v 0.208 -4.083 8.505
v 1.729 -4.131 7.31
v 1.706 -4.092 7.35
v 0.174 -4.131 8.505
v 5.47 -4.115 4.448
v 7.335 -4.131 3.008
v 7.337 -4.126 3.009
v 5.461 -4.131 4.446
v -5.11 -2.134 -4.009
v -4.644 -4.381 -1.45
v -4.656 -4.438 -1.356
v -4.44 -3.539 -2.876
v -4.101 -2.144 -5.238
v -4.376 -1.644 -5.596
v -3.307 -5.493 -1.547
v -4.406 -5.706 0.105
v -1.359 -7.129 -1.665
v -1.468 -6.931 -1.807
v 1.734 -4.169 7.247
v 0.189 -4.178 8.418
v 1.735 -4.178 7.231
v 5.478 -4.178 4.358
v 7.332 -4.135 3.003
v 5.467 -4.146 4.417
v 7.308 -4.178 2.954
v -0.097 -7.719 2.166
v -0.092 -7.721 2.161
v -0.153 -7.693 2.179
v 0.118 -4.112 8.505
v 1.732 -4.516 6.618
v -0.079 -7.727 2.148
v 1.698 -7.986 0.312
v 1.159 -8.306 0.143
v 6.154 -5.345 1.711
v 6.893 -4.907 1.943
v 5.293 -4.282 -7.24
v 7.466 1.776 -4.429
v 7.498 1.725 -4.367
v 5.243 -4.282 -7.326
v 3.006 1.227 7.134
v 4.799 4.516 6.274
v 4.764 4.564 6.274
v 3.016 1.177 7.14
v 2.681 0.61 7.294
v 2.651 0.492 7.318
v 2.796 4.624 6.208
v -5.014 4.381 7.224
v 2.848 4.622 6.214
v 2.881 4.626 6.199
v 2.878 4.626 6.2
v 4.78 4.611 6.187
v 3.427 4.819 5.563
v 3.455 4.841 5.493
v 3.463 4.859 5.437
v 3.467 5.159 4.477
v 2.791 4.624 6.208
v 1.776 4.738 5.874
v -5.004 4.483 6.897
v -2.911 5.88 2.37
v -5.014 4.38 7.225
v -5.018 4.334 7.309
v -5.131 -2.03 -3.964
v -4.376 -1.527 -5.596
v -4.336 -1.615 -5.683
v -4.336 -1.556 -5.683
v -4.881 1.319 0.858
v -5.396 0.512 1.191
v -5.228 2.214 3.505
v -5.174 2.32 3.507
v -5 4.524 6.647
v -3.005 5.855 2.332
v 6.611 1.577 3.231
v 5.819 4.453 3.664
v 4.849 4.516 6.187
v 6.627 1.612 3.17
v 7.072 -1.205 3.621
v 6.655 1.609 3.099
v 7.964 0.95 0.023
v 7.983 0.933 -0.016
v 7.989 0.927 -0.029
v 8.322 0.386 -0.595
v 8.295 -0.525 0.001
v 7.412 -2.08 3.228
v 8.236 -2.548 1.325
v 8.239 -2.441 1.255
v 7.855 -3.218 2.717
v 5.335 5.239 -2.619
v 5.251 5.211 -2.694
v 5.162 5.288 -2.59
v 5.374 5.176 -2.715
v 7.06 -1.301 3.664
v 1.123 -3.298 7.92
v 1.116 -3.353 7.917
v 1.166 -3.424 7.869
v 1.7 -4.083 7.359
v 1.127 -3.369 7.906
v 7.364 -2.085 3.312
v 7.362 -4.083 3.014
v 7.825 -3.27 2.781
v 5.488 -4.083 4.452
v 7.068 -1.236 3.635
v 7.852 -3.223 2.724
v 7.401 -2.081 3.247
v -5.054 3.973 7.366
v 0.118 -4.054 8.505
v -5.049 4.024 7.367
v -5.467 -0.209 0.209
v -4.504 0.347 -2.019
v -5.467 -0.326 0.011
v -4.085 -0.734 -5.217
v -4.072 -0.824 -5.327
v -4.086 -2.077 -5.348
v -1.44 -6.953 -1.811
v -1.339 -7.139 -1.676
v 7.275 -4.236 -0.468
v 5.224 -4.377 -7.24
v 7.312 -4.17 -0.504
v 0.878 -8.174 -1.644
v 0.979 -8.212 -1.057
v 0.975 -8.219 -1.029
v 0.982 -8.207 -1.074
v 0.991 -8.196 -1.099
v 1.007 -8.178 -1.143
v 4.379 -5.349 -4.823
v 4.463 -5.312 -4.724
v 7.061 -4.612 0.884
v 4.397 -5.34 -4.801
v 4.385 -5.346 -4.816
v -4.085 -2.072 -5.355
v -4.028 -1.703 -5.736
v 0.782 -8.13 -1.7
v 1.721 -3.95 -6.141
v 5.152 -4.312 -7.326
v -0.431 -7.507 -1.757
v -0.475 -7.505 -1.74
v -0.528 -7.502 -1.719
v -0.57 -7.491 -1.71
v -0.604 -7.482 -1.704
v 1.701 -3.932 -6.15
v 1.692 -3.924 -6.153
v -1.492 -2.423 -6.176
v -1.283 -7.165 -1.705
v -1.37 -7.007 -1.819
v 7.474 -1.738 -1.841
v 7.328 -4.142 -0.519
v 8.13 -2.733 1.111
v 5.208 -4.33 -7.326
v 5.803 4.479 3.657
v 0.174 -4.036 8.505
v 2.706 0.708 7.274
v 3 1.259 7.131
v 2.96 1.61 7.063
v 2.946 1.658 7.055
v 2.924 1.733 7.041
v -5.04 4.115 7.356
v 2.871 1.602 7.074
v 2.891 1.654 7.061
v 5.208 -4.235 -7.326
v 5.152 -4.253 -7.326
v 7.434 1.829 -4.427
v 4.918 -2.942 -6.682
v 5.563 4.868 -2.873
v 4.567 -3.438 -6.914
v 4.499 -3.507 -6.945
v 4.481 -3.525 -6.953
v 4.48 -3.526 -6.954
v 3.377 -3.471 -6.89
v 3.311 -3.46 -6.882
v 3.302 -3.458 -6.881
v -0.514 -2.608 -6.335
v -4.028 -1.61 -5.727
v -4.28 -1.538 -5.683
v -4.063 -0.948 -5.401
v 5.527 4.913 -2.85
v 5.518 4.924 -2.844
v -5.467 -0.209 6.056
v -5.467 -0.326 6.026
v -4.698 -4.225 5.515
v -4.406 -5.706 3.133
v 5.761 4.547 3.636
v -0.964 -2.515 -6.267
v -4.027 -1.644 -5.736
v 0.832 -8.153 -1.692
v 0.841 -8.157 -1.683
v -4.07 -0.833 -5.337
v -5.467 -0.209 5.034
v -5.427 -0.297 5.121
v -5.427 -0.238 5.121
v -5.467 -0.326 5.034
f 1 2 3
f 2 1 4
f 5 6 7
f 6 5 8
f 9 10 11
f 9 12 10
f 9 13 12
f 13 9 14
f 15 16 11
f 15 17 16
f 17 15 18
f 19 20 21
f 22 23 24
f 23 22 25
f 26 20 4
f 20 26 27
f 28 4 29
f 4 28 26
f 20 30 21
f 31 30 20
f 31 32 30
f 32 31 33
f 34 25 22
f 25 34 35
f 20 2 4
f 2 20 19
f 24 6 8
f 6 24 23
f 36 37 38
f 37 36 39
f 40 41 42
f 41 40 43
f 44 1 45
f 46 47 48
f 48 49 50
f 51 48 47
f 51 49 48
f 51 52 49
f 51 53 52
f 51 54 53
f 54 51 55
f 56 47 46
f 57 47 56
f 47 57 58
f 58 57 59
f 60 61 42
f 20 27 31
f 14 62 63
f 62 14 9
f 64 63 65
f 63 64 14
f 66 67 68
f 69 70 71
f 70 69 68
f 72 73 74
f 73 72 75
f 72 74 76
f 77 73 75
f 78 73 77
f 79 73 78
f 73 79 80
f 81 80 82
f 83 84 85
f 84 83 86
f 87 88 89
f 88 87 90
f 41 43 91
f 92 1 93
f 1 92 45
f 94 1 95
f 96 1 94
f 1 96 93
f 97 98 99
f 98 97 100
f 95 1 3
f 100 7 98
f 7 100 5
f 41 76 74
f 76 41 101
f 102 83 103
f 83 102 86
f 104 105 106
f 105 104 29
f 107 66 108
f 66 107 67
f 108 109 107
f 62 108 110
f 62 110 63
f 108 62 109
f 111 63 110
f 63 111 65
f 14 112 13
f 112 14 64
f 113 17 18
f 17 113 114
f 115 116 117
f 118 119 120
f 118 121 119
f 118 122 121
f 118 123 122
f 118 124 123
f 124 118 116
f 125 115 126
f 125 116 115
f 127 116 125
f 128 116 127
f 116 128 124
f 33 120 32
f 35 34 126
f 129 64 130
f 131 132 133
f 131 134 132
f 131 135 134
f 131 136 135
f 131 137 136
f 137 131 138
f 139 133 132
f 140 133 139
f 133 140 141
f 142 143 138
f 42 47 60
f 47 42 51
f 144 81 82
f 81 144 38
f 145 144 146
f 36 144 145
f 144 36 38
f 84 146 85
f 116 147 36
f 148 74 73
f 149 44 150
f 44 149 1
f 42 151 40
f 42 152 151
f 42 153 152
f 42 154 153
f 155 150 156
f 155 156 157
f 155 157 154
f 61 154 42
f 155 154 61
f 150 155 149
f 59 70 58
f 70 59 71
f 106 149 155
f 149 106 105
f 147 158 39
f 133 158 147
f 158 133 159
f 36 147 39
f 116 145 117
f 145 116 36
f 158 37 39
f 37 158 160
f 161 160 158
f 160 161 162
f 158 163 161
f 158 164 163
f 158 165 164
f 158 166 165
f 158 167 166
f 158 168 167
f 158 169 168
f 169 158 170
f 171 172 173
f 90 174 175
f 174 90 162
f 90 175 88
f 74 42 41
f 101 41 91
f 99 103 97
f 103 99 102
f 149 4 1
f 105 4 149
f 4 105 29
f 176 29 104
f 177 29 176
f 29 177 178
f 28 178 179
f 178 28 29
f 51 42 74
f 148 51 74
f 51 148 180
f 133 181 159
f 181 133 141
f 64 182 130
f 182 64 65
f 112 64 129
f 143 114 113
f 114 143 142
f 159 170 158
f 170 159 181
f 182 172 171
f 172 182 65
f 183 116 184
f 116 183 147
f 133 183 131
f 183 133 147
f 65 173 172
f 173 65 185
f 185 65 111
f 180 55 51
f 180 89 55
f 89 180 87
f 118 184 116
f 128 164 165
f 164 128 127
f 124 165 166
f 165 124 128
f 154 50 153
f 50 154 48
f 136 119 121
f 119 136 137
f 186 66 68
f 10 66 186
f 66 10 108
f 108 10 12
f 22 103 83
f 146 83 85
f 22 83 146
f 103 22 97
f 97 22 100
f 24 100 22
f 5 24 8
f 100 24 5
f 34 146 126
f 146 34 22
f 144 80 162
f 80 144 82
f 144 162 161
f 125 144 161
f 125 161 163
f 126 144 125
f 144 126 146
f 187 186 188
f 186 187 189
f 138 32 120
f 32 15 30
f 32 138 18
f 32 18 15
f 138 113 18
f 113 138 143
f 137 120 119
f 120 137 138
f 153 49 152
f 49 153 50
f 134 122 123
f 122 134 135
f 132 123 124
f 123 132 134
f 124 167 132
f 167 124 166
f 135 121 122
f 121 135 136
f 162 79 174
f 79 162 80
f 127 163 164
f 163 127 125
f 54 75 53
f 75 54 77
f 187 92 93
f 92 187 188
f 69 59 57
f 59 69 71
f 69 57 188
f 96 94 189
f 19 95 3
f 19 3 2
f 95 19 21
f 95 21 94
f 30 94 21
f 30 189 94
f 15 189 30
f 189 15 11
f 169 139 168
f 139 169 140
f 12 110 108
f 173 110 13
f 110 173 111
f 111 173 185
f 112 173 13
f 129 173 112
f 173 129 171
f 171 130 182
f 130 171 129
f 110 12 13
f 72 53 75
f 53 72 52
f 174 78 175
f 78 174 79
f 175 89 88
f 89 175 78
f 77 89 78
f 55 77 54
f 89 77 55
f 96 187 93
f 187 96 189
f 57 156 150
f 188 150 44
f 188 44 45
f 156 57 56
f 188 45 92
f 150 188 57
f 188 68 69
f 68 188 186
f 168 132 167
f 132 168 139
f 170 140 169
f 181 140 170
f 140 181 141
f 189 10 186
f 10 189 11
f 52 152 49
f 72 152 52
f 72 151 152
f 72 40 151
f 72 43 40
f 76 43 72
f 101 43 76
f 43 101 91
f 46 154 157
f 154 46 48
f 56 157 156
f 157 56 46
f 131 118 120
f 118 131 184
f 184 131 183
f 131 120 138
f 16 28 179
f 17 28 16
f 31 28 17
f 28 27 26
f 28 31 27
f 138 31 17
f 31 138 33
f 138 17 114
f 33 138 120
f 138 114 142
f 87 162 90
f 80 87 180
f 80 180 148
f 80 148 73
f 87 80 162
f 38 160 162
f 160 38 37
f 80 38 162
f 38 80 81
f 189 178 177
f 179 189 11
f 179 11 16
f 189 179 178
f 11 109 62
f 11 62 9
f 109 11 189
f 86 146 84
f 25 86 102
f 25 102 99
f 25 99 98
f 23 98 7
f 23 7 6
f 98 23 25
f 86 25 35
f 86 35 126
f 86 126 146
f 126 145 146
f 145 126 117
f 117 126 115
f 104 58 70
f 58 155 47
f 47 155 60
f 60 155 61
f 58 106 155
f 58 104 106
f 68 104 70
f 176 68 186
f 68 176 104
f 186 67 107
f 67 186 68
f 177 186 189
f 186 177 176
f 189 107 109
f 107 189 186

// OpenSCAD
// Auto-generated OpenSCAD file

    inner_points = 10*[[-0.4553770683985672, 0.816075390462194, -0.02826725120202972], [-0.3492651290097586, 0.27808264626453244, -0.8645112727111914], [0.3062996757811438, -0.4214091552352098, 0.8645112727111914], [0.4124116151699524, -0.9594018994328712, 0.02826725120202972], [0.45789115536956515, 0.630471121507822, -0.3908857929250278], [0.9045034915748815, -0.09513310390029023, 0.13259861870450954], [-0.5386073879474271, -0.026770981308893688, 0.5034118884114294], [-0.43249544855861854, -0.5647637255065552, -0.33283213309773235], [0.28106973038452526, 0.5396015179782265, 0.5891534403817997], [0.44860512332870417, -0.3098111524472321, -0.7311548260368412]];

    outer_points = 10*[[-0.8336003958246909, -0.4282242422434667, 0.3144481157395024], [-0.5192798779886039, 0.4282242422434667, 0.7239583176726031], [0.5192798779886039, -0.4282242422434667, -0.7239583176726031], [0.8336003958246909, 0.4282242422434667, -0.3144481157395024], [0.015816542021752034, -0.40830815643207485, 0.8417945059096876], [0.8090835339719289, -0.40830815643207485, 0.2329205620737586], [-0.42955329110383256, -0.15856661937867184, -0.559640382982223], [-0.11523277326774545, 0.6978818651082617, -0.15013018104912235], [-0.02137609852116739, -0.9005841684864844, -0.02784969457994478], [0.47489050229114943, 0.45162402044515604, 0.6187076390309791]];

    // Convex hull for inner set (I)
    module inner_hull() {
        hull() {
            for (p = inner_points) {
                translate(p) sphere(r=0.1);
            }
        }
    }

    // Convex hull for outer set (O) minus inner hull (O \ I)
    module outer_minus_inner() {
        difference() {
            hull() {
                for (p = outer_points) {
                    translate(p) sphere(r=0.1);
                }
            }
            inner_hull(); // Subtract inner hull
        }
    }

    // Convex hull for outer set (O) minus all translated inner hulls
    module outer_minus_AllTranslationInner() {
        difference() {
            hull() {
                for (p = outer_points) {
                    translate(p) sphere(r=0.1);
                }
            }
            hull() {
                translate([0,0,50]) inner_hull();
                translate([0,0,-50]) inner_hull();
            }; // Subtract translated inner hulls
        }
    }

    // Difference between outer_minus_inner and outer_minus_AllTranslationInner
    module outer_minus_inner_diff() {
        difference() {
            // Outer minus inner
            difference() {
                hull() {
                    for (p = outer_points) {
                        translate(p) sphere(r=0.1);
                    }
                }
                inner_hull();
            }

            // Subtract Outer minus AllTranslationInner
            difference() {
                hull() {
                    for (p = outer_points) {
                        translate(p) sphere(r=0.1);
                    }
                }
                hull() {
                    translate([0,0,50]) inner_hull();
                    translate([0,0,-50]) inner_hull();
                };
            }
        }
    }

    // Rendering all with colors applied
    color([1, 1, 0, 1]) outer_minus_inner_diff(); // Opaque yellow
    
